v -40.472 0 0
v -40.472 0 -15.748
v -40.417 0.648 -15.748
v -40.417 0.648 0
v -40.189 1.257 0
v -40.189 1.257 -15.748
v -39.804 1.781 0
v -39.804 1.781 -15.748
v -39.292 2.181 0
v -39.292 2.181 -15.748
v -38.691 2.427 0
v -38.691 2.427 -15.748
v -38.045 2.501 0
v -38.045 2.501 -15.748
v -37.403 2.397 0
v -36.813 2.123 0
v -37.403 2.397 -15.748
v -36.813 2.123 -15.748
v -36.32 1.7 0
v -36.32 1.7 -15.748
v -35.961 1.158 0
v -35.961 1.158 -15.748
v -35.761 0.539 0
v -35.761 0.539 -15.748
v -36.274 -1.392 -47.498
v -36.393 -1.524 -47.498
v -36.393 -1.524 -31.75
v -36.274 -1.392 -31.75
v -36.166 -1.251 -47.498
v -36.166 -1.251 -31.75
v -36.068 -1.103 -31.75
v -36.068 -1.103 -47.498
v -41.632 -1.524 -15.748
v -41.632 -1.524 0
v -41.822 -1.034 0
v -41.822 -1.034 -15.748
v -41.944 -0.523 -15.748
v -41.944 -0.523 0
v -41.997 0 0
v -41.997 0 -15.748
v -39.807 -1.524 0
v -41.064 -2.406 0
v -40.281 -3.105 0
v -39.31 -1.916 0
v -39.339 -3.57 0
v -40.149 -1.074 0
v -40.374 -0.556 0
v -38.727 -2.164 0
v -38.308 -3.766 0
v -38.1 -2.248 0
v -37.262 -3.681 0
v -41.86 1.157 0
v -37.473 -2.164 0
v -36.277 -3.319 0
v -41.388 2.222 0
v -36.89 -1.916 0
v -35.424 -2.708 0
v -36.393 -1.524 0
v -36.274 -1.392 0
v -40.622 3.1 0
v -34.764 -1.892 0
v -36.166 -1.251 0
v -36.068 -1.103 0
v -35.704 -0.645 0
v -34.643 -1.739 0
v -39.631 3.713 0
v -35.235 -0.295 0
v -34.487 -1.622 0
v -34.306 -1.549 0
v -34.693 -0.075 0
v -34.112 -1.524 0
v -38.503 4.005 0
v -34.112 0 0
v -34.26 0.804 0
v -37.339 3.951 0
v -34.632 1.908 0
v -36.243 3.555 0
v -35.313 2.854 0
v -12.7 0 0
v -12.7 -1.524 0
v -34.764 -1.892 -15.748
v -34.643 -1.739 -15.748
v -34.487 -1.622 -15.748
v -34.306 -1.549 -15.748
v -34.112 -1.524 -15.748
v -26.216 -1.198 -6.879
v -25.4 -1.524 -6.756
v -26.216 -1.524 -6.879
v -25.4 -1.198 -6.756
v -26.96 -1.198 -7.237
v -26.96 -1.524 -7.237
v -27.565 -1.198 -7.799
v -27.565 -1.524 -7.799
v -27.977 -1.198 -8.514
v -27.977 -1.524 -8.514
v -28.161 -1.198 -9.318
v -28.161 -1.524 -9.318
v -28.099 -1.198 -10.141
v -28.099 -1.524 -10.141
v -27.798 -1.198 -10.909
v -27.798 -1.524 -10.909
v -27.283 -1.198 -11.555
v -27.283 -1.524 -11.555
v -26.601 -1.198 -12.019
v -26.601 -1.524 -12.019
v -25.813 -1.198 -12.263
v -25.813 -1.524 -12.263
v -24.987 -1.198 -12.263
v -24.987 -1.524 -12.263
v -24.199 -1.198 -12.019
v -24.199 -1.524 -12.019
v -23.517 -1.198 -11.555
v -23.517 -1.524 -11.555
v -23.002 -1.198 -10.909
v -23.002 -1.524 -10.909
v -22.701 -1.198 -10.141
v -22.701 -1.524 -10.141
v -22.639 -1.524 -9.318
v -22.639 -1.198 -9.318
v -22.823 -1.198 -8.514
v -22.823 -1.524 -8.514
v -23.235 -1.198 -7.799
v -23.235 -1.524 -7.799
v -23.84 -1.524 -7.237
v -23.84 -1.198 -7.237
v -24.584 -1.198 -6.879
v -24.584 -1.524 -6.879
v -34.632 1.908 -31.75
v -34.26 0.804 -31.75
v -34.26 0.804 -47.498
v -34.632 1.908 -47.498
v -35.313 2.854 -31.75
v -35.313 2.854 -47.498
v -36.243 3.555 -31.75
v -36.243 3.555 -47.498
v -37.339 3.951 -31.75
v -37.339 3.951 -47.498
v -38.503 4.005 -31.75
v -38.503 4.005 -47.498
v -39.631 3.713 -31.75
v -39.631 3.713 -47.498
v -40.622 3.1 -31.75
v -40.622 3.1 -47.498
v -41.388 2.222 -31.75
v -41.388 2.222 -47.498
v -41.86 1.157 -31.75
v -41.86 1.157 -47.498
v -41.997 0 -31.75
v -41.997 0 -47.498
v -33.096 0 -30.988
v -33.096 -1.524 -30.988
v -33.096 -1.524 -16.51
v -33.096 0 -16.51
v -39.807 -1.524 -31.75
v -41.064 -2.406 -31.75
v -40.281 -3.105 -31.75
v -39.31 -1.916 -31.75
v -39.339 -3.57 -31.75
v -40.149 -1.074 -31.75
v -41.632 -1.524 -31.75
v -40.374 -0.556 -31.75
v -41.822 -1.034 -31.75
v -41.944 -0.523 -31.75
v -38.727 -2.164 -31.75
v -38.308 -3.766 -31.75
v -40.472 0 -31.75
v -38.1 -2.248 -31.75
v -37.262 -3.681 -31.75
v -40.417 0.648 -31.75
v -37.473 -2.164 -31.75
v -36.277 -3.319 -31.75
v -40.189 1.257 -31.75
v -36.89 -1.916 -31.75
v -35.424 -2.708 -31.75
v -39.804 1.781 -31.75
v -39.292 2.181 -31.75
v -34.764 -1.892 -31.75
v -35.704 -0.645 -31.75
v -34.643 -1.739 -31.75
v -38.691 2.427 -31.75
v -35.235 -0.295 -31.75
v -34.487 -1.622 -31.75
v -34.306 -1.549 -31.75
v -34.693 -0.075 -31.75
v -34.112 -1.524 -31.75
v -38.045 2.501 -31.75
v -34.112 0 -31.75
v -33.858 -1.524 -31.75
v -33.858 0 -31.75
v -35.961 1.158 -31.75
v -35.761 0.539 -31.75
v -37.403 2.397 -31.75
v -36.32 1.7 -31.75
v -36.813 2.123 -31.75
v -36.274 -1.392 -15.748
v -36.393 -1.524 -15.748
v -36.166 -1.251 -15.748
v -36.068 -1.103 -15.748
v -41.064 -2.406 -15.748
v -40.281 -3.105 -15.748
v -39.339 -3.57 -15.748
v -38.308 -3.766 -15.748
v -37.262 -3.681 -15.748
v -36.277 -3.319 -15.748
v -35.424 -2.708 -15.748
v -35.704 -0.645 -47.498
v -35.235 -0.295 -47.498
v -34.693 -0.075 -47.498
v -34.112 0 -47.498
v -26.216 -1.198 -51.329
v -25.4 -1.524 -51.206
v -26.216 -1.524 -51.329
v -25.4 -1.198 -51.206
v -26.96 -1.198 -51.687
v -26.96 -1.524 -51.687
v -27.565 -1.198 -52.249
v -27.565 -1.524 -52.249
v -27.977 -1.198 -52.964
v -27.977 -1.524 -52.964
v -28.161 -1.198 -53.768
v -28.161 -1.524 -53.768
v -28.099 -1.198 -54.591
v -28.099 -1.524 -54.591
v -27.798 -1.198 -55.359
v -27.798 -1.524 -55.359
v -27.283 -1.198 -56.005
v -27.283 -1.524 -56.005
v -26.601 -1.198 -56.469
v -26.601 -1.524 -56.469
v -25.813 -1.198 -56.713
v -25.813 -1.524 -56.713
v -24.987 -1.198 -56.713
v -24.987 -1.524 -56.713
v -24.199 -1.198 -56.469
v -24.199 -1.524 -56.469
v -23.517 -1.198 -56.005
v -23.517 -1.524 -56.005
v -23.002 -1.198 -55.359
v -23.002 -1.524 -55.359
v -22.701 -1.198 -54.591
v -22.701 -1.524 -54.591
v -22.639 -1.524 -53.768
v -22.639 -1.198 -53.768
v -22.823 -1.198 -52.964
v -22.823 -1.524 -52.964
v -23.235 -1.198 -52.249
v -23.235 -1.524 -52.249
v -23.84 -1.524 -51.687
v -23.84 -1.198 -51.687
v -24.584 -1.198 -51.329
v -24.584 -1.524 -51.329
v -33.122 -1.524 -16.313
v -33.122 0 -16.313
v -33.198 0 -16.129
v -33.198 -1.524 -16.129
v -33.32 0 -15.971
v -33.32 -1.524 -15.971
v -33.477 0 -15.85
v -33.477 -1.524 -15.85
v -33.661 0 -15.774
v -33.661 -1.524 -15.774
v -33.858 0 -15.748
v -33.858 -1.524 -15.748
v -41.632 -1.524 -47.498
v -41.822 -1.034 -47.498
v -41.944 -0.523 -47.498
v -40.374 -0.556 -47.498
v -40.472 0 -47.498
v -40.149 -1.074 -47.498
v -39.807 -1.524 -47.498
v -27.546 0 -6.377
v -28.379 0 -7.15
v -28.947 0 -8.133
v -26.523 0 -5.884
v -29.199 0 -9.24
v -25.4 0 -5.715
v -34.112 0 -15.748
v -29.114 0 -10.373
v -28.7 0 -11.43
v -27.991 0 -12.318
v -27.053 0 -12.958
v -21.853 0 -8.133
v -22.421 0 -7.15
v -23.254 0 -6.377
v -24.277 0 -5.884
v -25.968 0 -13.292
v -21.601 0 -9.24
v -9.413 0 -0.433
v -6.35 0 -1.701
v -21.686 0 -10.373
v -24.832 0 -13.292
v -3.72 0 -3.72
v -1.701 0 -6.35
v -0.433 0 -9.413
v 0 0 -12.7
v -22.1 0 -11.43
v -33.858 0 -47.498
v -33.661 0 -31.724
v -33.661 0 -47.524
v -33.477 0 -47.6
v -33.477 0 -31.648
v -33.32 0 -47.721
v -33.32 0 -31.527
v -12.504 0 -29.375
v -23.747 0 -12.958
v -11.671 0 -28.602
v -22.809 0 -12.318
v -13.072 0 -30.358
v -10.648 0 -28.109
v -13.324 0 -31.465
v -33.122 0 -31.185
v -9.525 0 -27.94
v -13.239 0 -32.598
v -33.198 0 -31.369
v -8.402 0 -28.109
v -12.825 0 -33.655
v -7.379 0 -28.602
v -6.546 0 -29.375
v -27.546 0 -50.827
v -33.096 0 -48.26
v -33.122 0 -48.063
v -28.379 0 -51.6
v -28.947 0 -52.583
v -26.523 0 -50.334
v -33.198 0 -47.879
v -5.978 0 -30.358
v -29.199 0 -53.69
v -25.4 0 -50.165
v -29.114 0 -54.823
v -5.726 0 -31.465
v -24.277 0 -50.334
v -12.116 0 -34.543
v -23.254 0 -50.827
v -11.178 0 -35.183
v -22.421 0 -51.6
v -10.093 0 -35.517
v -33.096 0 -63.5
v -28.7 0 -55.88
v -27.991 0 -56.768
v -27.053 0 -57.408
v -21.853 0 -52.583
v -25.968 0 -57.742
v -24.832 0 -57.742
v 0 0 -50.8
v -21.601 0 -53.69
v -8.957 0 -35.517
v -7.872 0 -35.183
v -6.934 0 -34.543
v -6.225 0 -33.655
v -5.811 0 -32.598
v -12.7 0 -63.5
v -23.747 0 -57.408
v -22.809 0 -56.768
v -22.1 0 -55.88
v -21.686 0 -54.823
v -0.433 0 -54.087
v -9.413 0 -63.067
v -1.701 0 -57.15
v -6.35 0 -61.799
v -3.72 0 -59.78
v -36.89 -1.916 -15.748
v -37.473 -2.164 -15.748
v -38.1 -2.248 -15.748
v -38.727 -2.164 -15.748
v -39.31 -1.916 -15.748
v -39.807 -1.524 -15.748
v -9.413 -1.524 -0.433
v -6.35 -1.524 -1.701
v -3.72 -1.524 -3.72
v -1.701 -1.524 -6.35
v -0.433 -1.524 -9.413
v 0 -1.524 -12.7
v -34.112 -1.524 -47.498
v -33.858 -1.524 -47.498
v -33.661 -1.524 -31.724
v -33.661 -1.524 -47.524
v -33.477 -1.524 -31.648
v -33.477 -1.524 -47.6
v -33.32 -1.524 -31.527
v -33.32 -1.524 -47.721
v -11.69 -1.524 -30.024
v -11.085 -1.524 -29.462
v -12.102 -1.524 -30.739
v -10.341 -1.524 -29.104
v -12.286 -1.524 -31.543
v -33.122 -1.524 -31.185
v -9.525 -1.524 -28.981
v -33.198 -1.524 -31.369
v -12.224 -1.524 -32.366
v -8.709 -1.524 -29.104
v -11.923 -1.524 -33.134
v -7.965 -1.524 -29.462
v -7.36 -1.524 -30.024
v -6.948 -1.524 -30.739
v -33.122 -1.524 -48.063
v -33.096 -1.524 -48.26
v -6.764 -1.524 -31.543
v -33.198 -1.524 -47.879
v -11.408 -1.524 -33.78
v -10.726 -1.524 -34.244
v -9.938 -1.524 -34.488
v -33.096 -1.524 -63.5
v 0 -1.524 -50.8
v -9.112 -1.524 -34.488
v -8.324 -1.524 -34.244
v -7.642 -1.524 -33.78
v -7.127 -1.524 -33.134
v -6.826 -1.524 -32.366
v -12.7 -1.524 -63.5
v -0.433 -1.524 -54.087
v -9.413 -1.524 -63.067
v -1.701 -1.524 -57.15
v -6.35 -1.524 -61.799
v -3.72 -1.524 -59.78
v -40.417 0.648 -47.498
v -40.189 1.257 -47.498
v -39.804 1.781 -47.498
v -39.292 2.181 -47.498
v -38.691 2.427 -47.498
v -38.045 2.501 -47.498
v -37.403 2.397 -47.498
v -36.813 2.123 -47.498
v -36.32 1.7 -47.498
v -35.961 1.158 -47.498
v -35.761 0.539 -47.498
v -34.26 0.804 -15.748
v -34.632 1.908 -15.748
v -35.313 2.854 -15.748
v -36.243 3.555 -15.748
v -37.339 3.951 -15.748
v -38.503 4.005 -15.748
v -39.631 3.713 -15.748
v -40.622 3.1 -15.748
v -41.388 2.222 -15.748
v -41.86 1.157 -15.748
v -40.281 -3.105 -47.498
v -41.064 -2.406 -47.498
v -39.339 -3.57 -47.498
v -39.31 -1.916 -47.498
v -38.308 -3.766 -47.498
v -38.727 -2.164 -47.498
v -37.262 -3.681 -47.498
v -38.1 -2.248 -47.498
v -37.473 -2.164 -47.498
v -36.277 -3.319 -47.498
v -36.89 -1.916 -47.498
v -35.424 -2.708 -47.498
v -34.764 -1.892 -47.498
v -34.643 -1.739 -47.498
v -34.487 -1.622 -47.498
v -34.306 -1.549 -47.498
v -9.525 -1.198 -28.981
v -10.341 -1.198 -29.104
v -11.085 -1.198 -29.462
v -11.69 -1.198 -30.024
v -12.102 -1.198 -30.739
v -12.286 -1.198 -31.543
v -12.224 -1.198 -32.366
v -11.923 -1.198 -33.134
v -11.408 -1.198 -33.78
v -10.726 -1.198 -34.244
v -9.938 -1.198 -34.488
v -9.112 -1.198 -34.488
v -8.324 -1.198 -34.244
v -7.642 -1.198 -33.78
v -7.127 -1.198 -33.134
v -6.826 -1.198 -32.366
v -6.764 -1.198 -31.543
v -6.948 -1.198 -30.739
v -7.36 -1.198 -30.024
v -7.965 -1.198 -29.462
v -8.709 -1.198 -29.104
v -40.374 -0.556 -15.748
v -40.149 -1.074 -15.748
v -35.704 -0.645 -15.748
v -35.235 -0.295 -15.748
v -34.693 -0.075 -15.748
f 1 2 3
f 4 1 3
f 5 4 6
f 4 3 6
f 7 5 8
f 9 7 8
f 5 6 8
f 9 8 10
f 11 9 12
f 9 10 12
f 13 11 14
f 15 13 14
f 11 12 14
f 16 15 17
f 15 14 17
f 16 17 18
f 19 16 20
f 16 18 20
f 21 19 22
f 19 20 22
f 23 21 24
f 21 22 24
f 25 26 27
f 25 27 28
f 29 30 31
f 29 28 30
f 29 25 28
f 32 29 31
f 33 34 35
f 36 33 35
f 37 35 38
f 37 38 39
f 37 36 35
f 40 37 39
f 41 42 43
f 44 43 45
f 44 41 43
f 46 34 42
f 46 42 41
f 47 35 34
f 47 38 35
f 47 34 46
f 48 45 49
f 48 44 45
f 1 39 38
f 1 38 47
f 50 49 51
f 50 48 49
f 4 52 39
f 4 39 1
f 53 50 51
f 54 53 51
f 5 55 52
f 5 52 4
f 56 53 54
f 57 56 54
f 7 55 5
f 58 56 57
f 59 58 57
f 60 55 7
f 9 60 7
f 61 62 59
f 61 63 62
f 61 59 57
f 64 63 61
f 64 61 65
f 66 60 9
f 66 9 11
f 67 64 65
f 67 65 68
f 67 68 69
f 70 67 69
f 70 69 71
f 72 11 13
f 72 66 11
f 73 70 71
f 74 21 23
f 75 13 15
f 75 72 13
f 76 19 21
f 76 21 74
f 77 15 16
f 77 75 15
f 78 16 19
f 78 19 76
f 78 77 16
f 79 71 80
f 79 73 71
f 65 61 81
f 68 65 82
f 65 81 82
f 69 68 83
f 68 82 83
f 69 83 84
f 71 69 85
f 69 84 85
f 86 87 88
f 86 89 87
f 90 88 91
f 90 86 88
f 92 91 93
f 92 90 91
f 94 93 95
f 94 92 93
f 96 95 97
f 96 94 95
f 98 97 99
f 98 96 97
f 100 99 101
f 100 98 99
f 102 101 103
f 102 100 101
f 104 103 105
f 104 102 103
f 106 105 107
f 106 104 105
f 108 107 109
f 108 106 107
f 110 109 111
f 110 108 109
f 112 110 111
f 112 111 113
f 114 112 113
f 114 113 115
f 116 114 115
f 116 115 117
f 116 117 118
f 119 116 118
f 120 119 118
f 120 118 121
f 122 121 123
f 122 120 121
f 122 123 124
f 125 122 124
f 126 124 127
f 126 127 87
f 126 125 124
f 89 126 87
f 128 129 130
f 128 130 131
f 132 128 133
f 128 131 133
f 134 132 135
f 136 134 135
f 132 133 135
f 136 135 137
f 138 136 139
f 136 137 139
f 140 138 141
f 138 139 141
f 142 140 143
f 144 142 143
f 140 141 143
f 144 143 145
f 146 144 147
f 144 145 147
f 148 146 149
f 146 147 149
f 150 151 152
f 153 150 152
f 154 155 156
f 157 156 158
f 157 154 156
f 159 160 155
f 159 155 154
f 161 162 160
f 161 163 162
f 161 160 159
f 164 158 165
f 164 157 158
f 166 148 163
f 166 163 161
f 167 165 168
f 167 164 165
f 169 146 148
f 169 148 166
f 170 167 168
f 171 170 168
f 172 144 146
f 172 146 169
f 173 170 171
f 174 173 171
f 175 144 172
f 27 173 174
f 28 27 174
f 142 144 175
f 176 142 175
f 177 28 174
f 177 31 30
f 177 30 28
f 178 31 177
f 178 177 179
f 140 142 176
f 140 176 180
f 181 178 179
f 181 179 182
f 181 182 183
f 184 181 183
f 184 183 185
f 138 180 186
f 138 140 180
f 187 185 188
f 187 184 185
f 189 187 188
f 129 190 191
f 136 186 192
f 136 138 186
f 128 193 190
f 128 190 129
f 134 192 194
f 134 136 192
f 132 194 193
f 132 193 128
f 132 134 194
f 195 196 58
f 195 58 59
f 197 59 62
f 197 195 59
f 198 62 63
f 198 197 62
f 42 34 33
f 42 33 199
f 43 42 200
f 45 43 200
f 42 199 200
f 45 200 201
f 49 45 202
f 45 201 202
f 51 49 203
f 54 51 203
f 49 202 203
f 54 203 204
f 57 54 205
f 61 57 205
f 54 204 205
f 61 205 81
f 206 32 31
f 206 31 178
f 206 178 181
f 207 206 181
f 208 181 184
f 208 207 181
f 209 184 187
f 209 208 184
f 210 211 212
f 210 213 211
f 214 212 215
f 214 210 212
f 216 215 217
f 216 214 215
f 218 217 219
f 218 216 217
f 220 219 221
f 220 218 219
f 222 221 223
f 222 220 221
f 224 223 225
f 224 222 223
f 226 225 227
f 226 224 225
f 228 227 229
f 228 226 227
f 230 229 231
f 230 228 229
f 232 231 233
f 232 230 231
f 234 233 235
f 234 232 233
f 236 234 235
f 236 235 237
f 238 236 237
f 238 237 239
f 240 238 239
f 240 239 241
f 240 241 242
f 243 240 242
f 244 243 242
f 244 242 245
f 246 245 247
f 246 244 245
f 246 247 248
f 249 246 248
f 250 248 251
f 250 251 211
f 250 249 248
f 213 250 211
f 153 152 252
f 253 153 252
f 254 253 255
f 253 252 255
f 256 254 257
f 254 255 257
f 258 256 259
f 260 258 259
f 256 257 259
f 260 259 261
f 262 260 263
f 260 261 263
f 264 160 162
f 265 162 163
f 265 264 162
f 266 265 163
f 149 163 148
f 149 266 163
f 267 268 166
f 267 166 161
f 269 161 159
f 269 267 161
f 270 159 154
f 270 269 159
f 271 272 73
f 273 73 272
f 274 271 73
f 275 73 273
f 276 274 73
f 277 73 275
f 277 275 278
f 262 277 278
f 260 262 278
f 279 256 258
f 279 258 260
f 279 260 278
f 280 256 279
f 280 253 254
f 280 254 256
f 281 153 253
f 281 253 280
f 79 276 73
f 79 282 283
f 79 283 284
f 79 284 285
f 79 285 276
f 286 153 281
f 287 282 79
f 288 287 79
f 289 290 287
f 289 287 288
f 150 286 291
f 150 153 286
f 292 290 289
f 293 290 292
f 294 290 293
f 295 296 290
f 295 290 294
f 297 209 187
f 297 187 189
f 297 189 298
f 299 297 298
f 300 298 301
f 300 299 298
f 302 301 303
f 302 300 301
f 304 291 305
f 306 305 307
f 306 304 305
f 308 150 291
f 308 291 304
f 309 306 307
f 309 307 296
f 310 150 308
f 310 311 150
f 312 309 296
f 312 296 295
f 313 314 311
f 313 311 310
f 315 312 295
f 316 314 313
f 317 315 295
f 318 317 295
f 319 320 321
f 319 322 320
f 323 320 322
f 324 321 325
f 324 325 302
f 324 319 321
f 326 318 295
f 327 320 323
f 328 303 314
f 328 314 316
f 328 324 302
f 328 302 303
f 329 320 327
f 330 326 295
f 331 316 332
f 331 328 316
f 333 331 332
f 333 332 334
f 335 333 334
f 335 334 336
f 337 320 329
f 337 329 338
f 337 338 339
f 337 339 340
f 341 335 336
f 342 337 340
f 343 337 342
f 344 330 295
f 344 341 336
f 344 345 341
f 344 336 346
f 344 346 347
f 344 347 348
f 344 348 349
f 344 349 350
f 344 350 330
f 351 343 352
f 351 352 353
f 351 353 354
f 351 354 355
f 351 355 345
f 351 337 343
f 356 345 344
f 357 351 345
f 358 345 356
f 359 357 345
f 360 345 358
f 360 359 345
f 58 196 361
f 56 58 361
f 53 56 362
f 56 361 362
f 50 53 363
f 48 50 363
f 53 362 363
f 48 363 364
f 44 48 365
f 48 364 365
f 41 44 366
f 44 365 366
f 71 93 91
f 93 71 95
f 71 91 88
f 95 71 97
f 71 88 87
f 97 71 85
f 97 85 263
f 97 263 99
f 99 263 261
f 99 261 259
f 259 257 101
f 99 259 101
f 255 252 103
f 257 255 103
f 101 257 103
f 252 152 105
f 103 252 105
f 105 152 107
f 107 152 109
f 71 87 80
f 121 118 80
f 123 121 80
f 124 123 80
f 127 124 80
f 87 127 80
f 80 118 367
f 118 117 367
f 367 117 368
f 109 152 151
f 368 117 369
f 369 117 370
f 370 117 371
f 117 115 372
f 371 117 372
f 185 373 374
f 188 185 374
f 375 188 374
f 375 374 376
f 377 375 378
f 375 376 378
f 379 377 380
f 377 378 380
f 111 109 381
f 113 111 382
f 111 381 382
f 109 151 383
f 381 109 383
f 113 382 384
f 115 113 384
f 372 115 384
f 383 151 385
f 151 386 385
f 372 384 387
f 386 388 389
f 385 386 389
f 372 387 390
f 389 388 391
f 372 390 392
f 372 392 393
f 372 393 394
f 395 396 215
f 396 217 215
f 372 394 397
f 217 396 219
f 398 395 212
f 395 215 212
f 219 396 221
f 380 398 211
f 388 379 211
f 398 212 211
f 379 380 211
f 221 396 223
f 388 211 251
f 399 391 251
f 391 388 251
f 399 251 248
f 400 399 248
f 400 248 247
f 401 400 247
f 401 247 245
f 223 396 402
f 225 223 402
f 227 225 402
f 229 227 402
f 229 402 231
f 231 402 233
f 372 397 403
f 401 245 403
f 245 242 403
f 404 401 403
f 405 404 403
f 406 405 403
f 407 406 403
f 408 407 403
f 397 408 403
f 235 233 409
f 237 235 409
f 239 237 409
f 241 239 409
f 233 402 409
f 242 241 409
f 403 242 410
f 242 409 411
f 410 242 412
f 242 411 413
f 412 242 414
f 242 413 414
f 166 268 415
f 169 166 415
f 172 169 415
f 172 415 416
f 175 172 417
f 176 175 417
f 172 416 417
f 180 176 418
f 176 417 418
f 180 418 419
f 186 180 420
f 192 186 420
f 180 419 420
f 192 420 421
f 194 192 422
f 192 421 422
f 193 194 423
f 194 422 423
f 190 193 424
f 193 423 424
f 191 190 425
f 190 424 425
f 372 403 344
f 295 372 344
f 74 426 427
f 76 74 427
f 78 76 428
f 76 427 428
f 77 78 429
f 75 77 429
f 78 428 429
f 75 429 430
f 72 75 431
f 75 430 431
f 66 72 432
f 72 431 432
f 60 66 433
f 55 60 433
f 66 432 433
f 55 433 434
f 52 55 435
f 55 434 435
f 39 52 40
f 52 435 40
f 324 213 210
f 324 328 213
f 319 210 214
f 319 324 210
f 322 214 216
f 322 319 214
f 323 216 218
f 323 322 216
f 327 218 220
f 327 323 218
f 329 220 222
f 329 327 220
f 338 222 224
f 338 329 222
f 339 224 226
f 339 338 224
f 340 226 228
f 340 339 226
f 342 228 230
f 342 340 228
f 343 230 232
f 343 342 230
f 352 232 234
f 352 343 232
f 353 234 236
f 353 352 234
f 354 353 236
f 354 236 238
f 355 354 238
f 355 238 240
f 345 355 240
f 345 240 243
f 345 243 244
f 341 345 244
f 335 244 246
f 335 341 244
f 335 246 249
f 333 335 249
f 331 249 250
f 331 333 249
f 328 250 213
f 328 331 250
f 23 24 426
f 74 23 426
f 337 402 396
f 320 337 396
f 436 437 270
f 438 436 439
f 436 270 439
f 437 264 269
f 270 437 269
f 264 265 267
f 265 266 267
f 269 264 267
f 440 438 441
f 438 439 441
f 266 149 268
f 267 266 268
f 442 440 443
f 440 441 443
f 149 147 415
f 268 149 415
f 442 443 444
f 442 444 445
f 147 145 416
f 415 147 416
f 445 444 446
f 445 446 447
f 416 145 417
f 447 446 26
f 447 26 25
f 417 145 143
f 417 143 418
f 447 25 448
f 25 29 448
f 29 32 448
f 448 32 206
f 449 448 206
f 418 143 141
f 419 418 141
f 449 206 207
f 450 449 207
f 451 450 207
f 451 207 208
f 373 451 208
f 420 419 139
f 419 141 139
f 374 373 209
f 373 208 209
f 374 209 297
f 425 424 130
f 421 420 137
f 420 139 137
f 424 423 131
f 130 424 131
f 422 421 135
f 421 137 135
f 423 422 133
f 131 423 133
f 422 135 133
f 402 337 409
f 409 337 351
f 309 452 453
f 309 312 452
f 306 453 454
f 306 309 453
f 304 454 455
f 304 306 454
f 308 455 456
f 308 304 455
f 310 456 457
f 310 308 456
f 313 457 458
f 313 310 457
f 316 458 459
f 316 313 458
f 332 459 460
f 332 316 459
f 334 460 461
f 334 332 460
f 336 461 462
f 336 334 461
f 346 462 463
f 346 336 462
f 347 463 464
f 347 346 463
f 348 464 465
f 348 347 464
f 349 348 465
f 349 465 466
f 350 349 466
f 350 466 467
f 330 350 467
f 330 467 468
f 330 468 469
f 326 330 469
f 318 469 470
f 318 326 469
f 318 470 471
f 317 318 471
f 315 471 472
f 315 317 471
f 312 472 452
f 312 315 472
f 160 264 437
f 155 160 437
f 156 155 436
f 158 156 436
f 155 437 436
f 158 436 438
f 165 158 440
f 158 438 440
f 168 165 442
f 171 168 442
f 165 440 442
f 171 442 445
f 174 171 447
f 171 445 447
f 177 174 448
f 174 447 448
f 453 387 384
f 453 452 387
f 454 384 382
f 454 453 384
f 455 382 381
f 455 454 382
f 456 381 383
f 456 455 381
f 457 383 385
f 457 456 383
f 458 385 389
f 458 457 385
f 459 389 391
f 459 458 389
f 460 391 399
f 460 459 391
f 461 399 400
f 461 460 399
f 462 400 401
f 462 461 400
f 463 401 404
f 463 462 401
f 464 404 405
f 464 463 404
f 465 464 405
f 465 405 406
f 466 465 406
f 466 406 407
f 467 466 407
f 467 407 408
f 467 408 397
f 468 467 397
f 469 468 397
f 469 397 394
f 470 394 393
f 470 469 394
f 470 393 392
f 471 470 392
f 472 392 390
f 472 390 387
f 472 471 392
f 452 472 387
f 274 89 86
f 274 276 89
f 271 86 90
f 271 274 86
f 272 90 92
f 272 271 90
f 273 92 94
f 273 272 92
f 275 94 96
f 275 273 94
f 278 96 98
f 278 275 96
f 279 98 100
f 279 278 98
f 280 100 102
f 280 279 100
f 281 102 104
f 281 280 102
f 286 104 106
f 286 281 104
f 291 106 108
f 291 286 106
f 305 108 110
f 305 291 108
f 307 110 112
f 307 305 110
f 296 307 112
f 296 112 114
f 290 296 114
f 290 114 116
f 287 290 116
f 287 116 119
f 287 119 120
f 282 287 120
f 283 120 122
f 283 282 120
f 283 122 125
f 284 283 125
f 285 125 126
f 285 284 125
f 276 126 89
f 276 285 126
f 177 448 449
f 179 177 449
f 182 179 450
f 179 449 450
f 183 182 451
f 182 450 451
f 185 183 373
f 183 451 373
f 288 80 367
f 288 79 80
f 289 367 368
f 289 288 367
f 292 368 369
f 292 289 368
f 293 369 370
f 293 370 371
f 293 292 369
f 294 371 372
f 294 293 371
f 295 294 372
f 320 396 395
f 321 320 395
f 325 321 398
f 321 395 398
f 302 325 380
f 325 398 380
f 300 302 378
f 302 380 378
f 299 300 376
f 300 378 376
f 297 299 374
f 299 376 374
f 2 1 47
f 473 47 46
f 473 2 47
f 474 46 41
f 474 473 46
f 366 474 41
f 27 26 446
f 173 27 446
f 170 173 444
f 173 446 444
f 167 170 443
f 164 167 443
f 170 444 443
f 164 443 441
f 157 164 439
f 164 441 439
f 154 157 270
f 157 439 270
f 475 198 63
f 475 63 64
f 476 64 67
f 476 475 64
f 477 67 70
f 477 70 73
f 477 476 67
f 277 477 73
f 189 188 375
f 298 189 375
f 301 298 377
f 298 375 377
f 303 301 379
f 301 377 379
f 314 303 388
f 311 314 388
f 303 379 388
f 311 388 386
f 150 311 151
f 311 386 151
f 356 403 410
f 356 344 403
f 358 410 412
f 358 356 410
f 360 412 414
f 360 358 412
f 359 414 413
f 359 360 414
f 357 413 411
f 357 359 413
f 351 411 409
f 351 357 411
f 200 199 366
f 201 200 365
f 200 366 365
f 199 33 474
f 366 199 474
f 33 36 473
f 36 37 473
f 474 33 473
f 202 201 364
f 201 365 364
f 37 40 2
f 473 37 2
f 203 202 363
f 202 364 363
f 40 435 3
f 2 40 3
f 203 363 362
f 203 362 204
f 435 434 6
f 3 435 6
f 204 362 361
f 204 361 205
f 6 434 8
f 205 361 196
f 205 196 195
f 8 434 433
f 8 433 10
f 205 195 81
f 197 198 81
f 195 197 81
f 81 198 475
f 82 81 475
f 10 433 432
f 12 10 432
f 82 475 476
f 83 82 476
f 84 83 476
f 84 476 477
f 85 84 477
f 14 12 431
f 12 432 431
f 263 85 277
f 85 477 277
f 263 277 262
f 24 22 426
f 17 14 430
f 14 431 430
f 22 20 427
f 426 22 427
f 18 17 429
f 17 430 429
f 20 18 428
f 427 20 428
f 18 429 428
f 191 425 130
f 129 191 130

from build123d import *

# Parameters (mm, degrees)
BASICHINGE_DEPTH                              = 63.5
KNUCKLECUTS_DEPTH                             = 77.238871136
KNUCKLECUTS_DEPTH_BACK                        = 77.238871136
CSK_FOR_6_FLAT_HEAD_MACHINE_SCREW1_AT_2_COUNT = 2
CSK_FOR_6_FLAT_HEAD_MACHINE_SCREW1_AT_2_PITCH = 27.312382723
CSK_FOR_6_FLAT_HEAD_MACHINE_SCREW1_AT_3_COUNT = 2
CSK_FOR_6_FLAT_HEAD_MACHINE_SCREW1_AT_3_PITCH = 27.312382723
FLATTEN_BENDS1_OUTLINE_W                      = 19.328541328
FLATTEN_BENDS1_OUTLINE_H                      = 15.748
FLATTEN_BENDS1_DEPTH                          = 4.0259
FLATTEN_BENDS1_START                          = -3.7719
FLATTEN_BENDS1_2_OUTLINE_W                    = 19.328541328
FLATTEN_BENDS1_2_OUTLINE_H                    = 15.748
FLATTEN_BENDS1_2_DEPTH                        = 2.2479
FLATTEN_BENDS1_START_2                        = -1.524
FLATTEN_BENDS1_3_OUTLINE_W                    = 19.328541328
FLATTEN_BENDS1_3_OUTLINE_H                    = 15.748
FLATTEN_BENDS1_3_DEPTH                        = 1.524
PROCESS_BENDS1_START                          = -47.498
PROCESS_BENDS1_DEPTH                          = 47.498
PROCESS_BENDS1_2_DEPTH                        = 15.748
PROCESS_BENDS1_START_2                        = -15.748
PROCESS_BENDS1_3_DEPTH                        = 15.748
FILLET1_R                                     = 12.7


# Read off the part's stored shape, not the designer's step: Flatten-Bends1, Process-Bends1
with BuildPart() as part:
    # Sketch1 → BasicHinge (new body)
    with BuildSketch(Plane.XY):
        with BuildLine():
            Line((0, -1.524), (0, 0))
            Line((0, 0), (-34.112341563, 0))
            ThreePointArc((-34.112341563, 0), (-35.234915175, -0.294612422), (-36.068141341, -1.102512262))
            ThreePointArc((-36.068141341, -1.102512262), (-40.434453767, 0.563435127), (-35.761180067, 0.539397057))
            Line((-35.761180067, 0.539397057), (-34.260333052, 0.80403688))
            ThreePointArc((-34.260333052, 0.80403688), (-41.932498965, 0.843500449), (-34.764274822, -1.891504087))
            ThreePointArc((-34.764274822, -1.891504087), (-34.486532767, -1.622204141), (-34.112341563, -1.524))
            Line((-34.112341563, -1.524), (0, -1.524))
        make_face()
    extrude(amount=-BASICHINGE_DEPTH)

    # Sketch4 → KnuckleCuts (cut, two sides: drawn at the far end of the back side and taken through both)
    with BuildSketch(Plane(origin=(0, 0, 0), x_dir=(-1, 0, 0), z_dir=(0, 1, 0)).offset(-KNUCKLECUTS_DEPTH_BACK)):
        with BuildLine():
            Line((41.9989, -63.5), (33.096341563, -63.5))
            Line((33.096341563, -63.5), (33.096341563, -48.26))
            ThreePointArc((33.096341563, -48.26), (33.319526196, -47.721184633), (33.858341563, -47.498))
            Line((33.858341563, -47.498), (41.9989, -47.498))
            Line((41.9989, -47.498), (41.9989, -63.5))
        make_face()
        with BuildLine():
            Line((41.9989, -31.75), (33.858341563, -31.75))
            ThreePointArc((33.858341563, -31.75), (33.319526196, -31.526815367), (33.096341563, -30.988))
            Line((33.096341563, -30.988), (33.096341563, -16.51))
            ThreePointArc((33.096341563, -16.51), (33.319526196, -15.971184633), (33.858341563, -15.748))
            Line((33.858341563, -15.748), (41.9989, -15.748))
            Line((41.9989, -15.748), (41.9989, -31.75))
        make_face()
    extrude(amount=KNUCKLECUTS_DEPTH + KNUCKLECUTS_DEPTH_BACK, mode=Mode.SUBTRACT)

    # Sketch5 → CSK for #6 Flat Head Machine Screw1 (revolve, cut)
    with BuildSketch(Plane(origin=(-9.525, 0, -31.75), x_dir=(0, 0, 1), z_dir=(1, 0, 0))):
        Polygon((0, 0), (0, 1.524), (2.7686, 1.524), (2.7686, 1.197993659), (3.81, 0), align=None)
    csk_for_6_flat_head_machine_screw1 = revolve(axis=Axis((-9.525, 6.35, -31.75), (0, -1, 0)), mode=Mode.SUBTRACT)

    # CSK for #6 Flat Head Machine Screw1 at 2: CSK for #6 Flat Head Machine Screw1 ×2
    with Locations(*[Vector(-0.5812381937190965, 0, 0.813733471206735) * (i * CSK_FOR_6_FLAT_HEAD_MACHINE_SCREW1_AT_2_PITCH) for i in range(1, CSK_FOR_6_FLAT_HEAD_MACHINE_SCREW1_AT_2_COUNT)]):
        add(csk_for_6_flat_head_machine_screw1, mode=Mode.SUBTRACT)

    # CSK for #6 Flat Head Machine Screw1 at 3: CSK for #6 Flat Head Machine Screw1 ×2
    with Locations(*[Vector(-0.5812381937190965, 0, -0.813733471206735) * (i * CSK_FOR_6_FLAT_HEAD_MACHINE_SCREW1_AT_3_PITCH) for i in range(1, CSK_FOR_6_FLAT_HEAD_MACHINE_SCREW1_AT_3_COUNT)]):
        add(csk_for_6_flat_head_machine_screw1, mode=Mode.SUBTRACT)

    # Flatten-Bends1 outline → Flatten-Bends1 (cut)
    with BuildSketch(Plane(origin=(0, 0, 0), x_dir=(1, 0, 0), z_dir=(0, 1, 0))):
        with Locations((-42.664270664, 39.624)):
            Rectangle(FLATTEN_BENDS1_OUTLINE_W, FLATTEN_BENDS1_OUTLINE_H)
        with Locations((-42.664270664, 7.874)):
            Rectangle(FLATTEN_BENDS1_OUTLINE_W, FLATTEN_BENDS1_OUTLINE_H)
    extrude(amount=FLATTEN_BENDS1_DEPTH, mode=Mode.SUBTRACT)

    # Flatten-Bends1 2 outline → Flatten-Bends1 2 (cut)
    with BuildSketch(Plane(origin=(0, 0, 0), x_dir=(1, 0, 0), z_dir=(0, 1, 0)).offset(FLATTEN_BENDS1_START)):
        with Locations((-42.664270664, 39.624)):
            Rectangle(FLATTEN_BENDS1_2_OUTLINE_W, FLATTEN_BENDS1_2_OUTLINE_H)
        with Locations((-42.664270664, 7.874)):
            Rectangle(FLATTEN_BENDS1_2_OUTLINE_W, FLATTEN_BENDS1_2_OUTLINE_H)
    extrude(amount=FLATTEN_BENDS1_2_DEPTH, mode=Mode.SUBTRACT)

    # Flatten-Bends1 3 outline → Flatten-Bends1 3 (add)
    with BuildSketch(Plane(origin=(0, 0, 0), x_dir=(1, 0, 0), z_dir=(0, 1, 0)).offset(FLATTEN_BENDS1_START_2)):
        with Locations((-42.664270664, 39.624)):
            Rectangle(FLATTEN_BENDS1_3_OUTLINE_W, FLATTEN_BENDS1_3_OUTLINE_H)
        with Locations((-42.664270664, 7.874)):
            Rectangle(FLATTEN_BENDS1_3_OUTLINE_W, FLATTEN_BENDS1_3_OUTLINE_H)
    extrude(amount=FLATTEN_BENDS1_3_DEPTH)

    # Process-Bends1 outline → Process-Bends1 (cut)
    with BuildSketch(Plane.XY.offset(PROCESS_BENDS1_START)):
        with BuildLine():
            ThreePointArc((-36.392853547, -1.524), (-36.218656654, -1.322378221), (-36.068141341, -1.102512262))
            ThreePointArc((-36.068141341, -1.102512262), (-35.234915175, -0.294612422), (-34.112341563, 0))
            Line((-34.112341563, 0), (-40.471501847, 0))
            ThreePointArc((-40.471501847, 0), (-40.277036286, -0.822032677), (-39.807146453, -1.524))
            Line((-39.807146453, -1.524), (-36.392853547, -1.524))
        make_face()
        with BuildLine():
            Line((-52.328541328, -1.524), (-41.632084401, -1.524))
            ThreePointArc((-41.632084401, -1.524), (-41.891812256, -0.780513652), (-41.996831047, 0))
            Line((-41.996831047, 0), (-52.328541328, 0))
            Line((-52.328541328, 0), (-52.328541328, -1.524))
        make_face()
    extrude(amount=PROCESS_BENDS1_DEPTH, mode=Mode.SUBTRACT)

    # Process-Bends1 2 outline → Process-Bends1 2 (add)
    with BuildSketch(Plane.XY.offset(PROCESS_BENDS1_START)):
        with BuildLine():
            Line((-34.112341563, -1.524), (-36.392853547, -1.524))
            ThreePointArc((-36.392853547, -1.524), (-38.1, -2.247900001), (-39.807146453, -1.524))
            Line((-39.807146453, -1.524), (-41.632084401, -1.524))
            ThreePointArc((-41.632084401, -1.524), (-38.308336386, -3.76632983), (-34.764274822, -1.891504087))
            ThreePointArc((-34.764274822, -1.891504087), (-34.486532767, -1.622204141), (-34.112341563, -1.524))
        make_face()
        with BuildLine():
            Line((-41.996831047, 0), (-40.471501847, 0))
            ThreePointArc((-40.471501847, 0), (-38.370193122, 2.486479961), (-35.761180067, 0.539397057))
            Line((-35.761180067, 0.539397057), (-34.260333052, 0.80403688))
            ThreePointArc((-34.260333052, 0.80403688), (-38.503033199, 4.00501308), (-41.996831047, 0))
        make_face()
    extrude(amount=PROCESS_BENDS1_2_DEPTH)

    # Process-Bends1 3 outline → Process-Bends1 3 (add)
    with BuildSketch(Plane.XY.offset(PROCESS_BENDS1_START_2)):
        with BuildLine():
            Line((-34.112341563, -1.524), (-36.392853547, -1.524))
            ThreePointArc((-36.392853547, -1.524), (-38.1, -2.247900001), (-39.807146453, -1.524))
            Line((-39.807146453, -1.524), (-41.632084401, -1.524))
            ThreePointArc((-41.632084401, -1.524), (-38.308336386, -3.76632983), (-34.764274822, -1.891504087))
            ThreePointArc((-34.764274822, -1.891504087), (-34.486532767, -1.622204141), (-34.112341563, -1.524))
        make_face()
        with BuildLine():
            Line((-41.996831047, 0), (-40.471501847, 0))
            ThreePointArc((-40.471501847, 0), (-38.370193122, 2.486479961), (-35.761180067, 0.539397057))
            Line((-35.761180067, 0.539397057), (-34.260333052, 0.80403688))
            ThreePointArc((-34.260333052, 0.80403688), (-38.503033199, 4.00501308), (-41.996831047, 0))
        make_face()
    extrude(amount=PROCESS_BENDS1_3_DEPTH)

    # Fillet1
    fillet1_edges = [part.edges().sort_by_distance(p)[0] for p in [
        (0, -0.762, -63.5),
        (0, -0.762, 0),
    ]]
    fillet(fillet1_edges, radius=FILLET1_R)


solid = part.part
